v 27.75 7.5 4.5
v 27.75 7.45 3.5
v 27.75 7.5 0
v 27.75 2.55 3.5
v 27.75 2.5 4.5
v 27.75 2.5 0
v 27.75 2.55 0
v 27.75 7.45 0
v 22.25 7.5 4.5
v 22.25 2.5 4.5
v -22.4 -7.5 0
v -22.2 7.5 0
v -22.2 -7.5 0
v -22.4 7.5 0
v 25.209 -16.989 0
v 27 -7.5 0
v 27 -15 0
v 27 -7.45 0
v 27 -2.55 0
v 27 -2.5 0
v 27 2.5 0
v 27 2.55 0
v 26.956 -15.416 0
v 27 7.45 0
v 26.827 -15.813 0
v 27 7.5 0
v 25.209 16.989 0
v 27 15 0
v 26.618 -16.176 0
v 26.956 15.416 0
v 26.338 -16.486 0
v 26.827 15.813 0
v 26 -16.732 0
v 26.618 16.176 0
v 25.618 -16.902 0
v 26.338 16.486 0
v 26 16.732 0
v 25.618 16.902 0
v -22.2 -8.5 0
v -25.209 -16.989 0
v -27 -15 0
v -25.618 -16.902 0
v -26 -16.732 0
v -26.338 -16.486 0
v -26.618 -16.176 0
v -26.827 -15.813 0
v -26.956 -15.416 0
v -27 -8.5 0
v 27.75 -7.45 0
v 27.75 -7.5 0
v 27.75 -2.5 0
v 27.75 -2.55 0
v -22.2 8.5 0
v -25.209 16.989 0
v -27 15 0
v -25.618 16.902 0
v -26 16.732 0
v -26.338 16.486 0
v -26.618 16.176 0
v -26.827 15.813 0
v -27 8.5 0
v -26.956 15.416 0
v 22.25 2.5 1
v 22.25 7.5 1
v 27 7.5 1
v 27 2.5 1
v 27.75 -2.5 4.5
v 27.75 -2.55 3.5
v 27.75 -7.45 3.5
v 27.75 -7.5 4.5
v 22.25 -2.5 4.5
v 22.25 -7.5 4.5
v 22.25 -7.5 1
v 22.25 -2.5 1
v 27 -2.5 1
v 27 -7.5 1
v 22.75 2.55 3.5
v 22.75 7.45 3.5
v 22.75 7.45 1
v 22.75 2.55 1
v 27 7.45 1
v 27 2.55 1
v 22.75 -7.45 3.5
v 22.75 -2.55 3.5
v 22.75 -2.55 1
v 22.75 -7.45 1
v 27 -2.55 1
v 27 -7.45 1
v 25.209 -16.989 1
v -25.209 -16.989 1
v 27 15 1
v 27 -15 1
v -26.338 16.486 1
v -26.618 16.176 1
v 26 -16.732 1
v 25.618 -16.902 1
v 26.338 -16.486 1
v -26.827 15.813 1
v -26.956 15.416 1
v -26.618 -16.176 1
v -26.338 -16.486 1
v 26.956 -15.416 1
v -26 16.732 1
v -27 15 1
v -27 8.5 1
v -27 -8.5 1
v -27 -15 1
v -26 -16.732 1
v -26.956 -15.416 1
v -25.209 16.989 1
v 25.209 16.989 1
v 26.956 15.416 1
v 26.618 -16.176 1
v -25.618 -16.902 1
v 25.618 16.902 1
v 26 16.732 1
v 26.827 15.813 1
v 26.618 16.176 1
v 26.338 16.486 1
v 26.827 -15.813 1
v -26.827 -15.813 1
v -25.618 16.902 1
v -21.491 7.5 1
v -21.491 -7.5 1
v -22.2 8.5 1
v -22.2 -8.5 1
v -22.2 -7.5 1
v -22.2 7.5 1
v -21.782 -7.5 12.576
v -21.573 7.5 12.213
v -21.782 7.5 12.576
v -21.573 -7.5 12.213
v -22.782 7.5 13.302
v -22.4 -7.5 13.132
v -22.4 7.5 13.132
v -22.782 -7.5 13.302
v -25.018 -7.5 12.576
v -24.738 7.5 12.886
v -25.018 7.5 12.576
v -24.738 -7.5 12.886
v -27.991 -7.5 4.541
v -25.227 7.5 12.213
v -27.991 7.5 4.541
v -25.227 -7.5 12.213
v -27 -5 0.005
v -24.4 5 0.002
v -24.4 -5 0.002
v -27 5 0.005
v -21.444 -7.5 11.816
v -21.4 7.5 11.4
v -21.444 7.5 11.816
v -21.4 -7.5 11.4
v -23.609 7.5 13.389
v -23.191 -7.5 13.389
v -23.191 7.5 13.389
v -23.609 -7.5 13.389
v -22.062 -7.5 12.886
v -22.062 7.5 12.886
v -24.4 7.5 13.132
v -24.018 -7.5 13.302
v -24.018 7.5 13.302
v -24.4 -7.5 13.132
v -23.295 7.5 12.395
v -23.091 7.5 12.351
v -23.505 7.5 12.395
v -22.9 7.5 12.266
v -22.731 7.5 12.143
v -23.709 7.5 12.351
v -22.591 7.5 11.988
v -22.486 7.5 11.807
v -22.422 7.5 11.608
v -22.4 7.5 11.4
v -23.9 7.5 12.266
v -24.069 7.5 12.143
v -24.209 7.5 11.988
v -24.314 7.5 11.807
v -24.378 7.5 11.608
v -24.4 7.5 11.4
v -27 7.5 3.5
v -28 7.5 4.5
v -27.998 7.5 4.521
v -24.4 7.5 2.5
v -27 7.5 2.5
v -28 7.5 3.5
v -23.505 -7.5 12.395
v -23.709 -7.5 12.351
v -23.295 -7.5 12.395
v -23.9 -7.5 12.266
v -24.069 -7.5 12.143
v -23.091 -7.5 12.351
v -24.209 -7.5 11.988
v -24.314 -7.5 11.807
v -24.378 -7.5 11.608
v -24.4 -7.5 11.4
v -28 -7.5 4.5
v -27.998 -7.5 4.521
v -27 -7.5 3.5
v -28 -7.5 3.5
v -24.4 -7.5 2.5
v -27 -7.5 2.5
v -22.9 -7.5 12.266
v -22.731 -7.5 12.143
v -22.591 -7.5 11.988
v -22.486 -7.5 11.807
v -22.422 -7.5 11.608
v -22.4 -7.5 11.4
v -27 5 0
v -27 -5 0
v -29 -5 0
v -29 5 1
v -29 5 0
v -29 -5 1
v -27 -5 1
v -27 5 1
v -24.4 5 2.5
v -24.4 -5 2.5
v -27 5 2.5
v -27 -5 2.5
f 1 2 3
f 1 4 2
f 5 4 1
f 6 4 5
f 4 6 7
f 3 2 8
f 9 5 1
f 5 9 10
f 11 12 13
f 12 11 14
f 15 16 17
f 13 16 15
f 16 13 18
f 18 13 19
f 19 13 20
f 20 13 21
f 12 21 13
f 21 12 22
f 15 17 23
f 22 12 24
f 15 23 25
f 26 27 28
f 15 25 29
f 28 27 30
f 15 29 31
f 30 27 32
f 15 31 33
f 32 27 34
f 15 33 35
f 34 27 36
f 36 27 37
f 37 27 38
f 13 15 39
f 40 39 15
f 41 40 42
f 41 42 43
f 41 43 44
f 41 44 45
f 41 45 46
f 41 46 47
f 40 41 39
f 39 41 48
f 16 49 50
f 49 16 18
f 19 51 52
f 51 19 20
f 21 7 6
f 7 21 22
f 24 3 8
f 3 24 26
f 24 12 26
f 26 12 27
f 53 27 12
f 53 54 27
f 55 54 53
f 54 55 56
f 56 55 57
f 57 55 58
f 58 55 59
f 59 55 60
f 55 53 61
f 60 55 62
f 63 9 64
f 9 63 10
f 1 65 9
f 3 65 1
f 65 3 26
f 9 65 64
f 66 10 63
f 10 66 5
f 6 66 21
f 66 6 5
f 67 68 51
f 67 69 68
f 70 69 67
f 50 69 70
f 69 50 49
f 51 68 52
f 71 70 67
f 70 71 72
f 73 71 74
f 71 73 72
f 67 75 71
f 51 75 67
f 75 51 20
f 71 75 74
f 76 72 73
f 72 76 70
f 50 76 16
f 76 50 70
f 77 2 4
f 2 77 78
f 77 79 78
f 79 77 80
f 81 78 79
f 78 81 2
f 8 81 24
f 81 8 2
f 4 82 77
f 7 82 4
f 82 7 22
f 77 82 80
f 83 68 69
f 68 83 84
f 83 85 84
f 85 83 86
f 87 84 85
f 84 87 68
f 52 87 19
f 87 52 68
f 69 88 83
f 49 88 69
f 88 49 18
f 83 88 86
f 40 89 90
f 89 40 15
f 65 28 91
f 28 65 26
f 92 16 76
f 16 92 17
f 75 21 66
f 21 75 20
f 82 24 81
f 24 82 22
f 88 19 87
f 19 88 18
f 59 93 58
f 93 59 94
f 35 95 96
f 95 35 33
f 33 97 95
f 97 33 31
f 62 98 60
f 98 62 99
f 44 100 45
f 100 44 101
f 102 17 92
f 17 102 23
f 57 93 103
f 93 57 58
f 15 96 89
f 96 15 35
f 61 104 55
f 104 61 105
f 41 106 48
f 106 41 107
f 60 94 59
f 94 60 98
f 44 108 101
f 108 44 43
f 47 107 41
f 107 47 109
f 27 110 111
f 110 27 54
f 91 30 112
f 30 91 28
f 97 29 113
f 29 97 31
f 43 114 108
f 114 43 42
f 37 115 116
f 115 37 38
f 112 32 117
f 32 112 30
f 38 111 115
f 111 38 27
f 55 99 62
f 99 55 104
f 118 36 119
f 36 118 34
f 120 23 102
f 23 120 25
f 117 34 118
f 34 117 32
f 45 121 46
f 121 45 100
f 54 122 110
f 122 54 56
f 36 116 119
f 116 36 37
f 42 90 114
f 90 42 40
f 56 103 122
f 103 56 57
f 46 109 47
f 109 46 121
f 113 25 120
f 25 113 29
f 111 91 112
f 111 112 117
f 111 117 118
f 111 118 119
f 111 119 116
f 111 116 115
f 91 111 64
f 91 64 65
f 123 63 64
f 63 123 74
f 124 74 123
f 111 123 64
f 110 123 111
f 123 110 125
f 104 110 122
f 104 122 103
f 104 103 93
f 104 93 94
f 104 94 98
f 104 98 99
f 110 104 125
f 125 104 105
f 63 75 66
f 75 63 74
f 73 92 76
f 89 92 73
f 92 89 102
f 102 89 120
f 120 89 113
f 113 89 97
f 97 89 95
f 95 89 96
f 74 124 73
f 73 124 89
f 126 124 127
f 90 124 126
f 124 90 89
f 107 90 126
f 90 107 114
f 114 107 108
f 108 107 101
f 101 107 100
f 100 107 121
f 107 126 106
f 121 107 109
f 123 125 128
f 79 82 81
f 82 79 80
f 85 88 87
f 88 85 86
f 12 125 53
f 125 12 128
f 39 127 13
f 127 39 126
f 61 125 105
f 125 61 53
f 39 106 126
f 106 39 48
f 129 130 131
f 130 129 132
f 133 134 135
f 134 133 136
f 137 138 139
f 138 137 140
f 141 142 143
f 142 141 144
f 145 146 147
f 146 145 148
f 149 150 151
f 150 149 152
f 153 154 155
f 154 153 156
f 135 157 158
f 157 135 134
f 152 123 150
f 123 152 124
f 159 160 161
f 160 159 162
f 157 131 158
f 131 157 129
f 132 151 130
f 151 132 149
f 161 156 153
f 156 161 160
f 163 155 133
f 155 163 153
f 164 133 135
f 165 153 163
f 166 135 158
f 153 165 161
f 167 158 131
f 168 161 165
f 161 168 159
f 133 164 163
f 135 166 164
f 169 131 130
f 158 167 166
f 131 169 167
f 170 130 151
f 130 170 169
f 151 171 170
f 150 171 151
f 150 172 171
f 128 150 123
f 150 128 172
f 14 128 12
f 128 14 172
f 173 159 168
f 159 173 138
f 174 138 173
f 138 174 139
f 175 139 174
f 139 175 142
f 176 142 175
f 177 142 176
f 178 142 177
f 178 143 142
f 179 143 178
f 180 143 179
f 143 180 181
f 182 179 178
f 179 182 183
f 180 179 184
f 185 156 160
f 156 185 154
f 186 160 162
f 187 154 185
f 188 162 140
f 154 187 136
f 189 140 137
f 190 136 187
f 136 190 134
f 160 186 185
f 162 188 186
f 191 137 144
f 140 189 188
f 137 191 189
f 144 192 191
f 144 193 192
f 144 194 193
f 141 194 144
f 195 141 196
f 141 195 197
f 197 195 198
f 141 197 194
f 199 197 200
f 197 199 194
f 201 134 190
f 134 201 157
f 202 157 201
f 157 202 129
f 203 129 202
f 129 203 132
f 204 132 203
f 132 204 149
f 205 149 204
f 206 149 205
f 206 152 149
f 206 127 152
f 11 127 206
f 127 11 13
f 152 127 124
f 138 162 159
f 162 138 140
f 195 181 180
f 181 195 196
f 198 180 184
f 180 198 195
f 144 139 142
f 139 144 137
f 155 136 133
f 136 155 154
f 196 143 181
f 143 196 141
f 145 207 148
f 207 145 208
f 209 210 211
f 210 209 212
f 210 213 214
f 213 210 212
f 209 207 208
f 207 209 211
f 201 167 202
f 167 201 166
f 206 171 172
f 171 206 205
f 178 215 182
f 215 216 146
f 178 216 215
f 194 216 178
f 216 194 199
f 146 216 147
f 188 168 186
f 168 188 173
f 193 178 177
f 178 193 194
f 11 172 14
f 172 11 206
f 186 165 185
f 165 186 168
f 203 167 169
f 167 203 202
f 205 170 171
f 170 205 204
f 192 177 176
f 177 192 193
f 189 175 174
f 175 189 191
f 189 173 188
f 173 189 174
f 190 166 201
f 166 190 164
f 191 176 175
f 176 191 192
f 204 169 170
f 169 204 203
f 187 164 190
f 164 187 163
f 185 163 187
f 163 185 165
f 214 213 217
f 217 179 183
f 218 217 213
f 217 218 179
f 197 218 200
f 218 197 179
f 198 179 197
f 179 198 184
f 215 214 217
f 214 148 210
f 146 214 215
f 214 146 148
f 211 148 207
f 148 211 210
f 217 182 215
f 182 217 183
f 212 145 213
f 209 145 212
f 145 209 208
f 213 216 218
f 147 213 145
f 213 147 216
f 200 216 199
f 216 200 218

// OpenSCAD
// This thing generates custom battery covers
//
// v2.0
//
// Licenced under Creative Commons: Attribution, Share-Alike
//		http://creativecommons.org/licenses/by-sa/3.0/
// For attribution you can direct people to the original file on thingiverse:
// 		http://www.thingiverse.com/thing:243269

// ================ variables

//CUSTOMIZER VARIABLES

/* [Basic] */

// how long the battery cover is.  (This dimension is in the clip-to-ears direction.)
length=50; // 10:200

// how wide the battery cover is
width=30; // 10:200

// how thick the battery cover is
thickness=0.5;  // 0.1:10

// radius for rounding over the corners of the battery cover
corner_radius=2;  // 0:10

// how thick the case plastic is
case_thickness=3.5;

// for generating support material.  Can be 0.
support_thickness=0.05;

/* [Ears] */

// how wide the ear tabs are
ear_width=5;  // 2:25

// how wide the ear tabs are
ear_length=5;  // 2:25

// how far apart the ear tabs are.  (To create one wide tab, just set this to 0.)
ear_spacing=10;  // 1:100

// How thick the case is where the ears attach.  Usually it should be the same as "thickness" on the "basic" tab
ear_case_thickness=3.5;  // 0.1:10

/* [Clip] */

// How wide the clip is
clip_width=15; // 5:50

// How deep the clip is (overhang)
clip_depth=1;

// How long the clip is
clip_length=5.8; // 5.8

// This is used for a side-engagement clip.  Most clips are this way now.  It measures how wide the small part of the clip is.
clip_width_sides=10;

// This is for a front-engagement clip.  If unused, set it to 0, otherwise, how long the catch will be (usually about 2-3mm)
clip_length_catch=1;

// How far the clip is in/out relative to the edge of the battery cover.
//clip_indent=0;  // -15:15

// This is how far down into the battery case the clip engages.  Usually it should be the same as "thickness" on the "basic" tab
clip_case_thickness=3.5;  // 0.1:10

// The thickness of the finger tab
tab_thickness=1;

/* [Gussets] */

// Which direction the support gussets go
gusset_orientation=0; // [0:clip_lengthwise,1:clip_widthwise]

// How thick the gussets are (set to 0 to turn off gussets)
gusset_thickness=0;

// How high the gussets are
gusset_height=0;

// How far apart the gussets are
gusset_spacing=0;

/* [Advanced] */

// Resolution
$fn=30;

/* [hidden] */

scoche=0.01;
halfscoche=scoche/2;

cover(width,length,thickness,case_thickness,gusset_thickness,corner_radius,ear_width,ear_spacing,clip_width,clip_width_sides,clip_length,clip_length_catch,clip_case_thickness,ear_length,tab_thickness);

module clip(clip_width=15,clip_width_sides=10,clip_length=1,clip_case_thickness=5,clip_length_catch=3,tab_thickness=3) {
	top_r=2;
	top_r_x=3.6;
	top_r_y=10.4;
	inside_corner_x=5;
	overlap_tab_w=2;
	inside_void_d1=2;
	inside_void_d2=2;
	inside_void_x=3.6;
	
	rotate([90,0,0]){
		difference () {
			union(){ // the outside shape
				hull () {
					translate([0,0,0]) cylinder(r=1,h=clip_width); // outside radius
					translate([inside_corner_x-1/2,-1,0]) cube([1,1,clip_width]); // inside corner
					translate([top_r_x,top_r_y,0]) cylinder(r=top_r,h=clip_width); // top
					if(clip_length_catch>0){
						translate([-clip_length_catch+0.1,clip_case_thickness,0]) cylinder(r=0.1,h=clip_width); // add a front overhang
					}
				}
				translate([-overlap_tab_w,-1,0]) cube([overlap_tab_w,tab_thickness,clip_width]); // the overlap tab
			}
			union(){ 
				translate([inside_void_x,0,0]) hull() { // The inside void
					translate([0,10.4,-clip_width/2]) cylinder(r=inside_void_d1/2,h=clip_width*2);
					translate([-inside_void_d2/2,-tab_thickness-scoche,-clip_width/2]) cube([inside_void_d2,scoche,clip_width*2]);
				}
				// trim the tab overhang
				translate([-tab_thickness-clip_depth,0,-clip_width/2]) cube([clip_depth*2,clip_case_thickness-tab_thickness,clip_width*2]); // trim off outside
				// trim the tab width
				translate([-2-halfscoche,-2,-(clip_width-clip_width_sides)/2]) cube([5+scoche,clip_case_thickness,(clip_width-clip_width_sides)]); // trim off left side
				translate([-2-halfscoche,-2,clip_width-(clip_width-clip_width_sides)/2]) cube([5+scoche,clip_case_thickness,(clip_width-clip_width_sides)]); // trim off right side
			}
		}
	}
}

module cover(width=30,length=60,thickness=0.5,case_thickness=3.9,gusset_thickness=4.5,corner_radius=1,ear_width=7.5,ear_spacing=29,clip_width=15,clip_width_sides=10,clip_length=1,clip_length_catch=3,clip_case_thickness=5,ear_length=5.8,tab_thickness=3) {
	clip_thickness=1;
	difference(){
		// the base shape
		union(){
			// the face
			translate([-length/2,-width/2,0]) 
			minkowski(){
				cube([length,width,thickness]);
				if(corner_radius>0) cylinder(r=corner_radius,h=thickness);
			}
			// gussets
			translate([8.1,0,0]) cube([54.8,1.6,gusset_thickness]);
			translate([8.1,64.4,0]) cube([54.8,1.6,gusset_thickness]);
			
			difference(){// the ears
				union(){
					translate([(length-ear_length-thickness)/2,(ear_spacing/2)-(ear_width/2),0]) cube([ear_length+thickness,ear_width,case_thickness+thickness*2]);
					translate([(length-ear_length-thickness)/2,(-ear_spacing/2)+(-ear_width/2),0]) cube([ear_length+thickness,ear_width,case_thickness+thickness*2]);
				}	
				translate([(length-ear_length+thickness)/2,(ear_spacing/2)-(ear_width/2)+support_thickness,0]) cube([ear_length,ear_width-support_thickness*2,case_thickness]);
				translate([(length-ear_length+thickness)/2,(-ear_spacing/2)+(-ear_width/2)+support_thickness,0]) cube([ear_length,ear_width-support_thickness*2,case_thickness]);
			}
		}
		union(){
			// hole for clip
			translate([(-length/2)-corner_radius,-clip_width/2-1,-scoche]) cube([clip_length-clip_thickness,clip_width+2,thickness*2+scoche]); // the hole for the clip
			// cutout for ears
		}
	}
	// the clip itsself
	translate([(-length/2)-corner_radius,clip_width/2,1]) clip(clip_width,clip_width_sides,clip_length,clip_case_thickness,clip_length_catch,tab_thickness);
}
